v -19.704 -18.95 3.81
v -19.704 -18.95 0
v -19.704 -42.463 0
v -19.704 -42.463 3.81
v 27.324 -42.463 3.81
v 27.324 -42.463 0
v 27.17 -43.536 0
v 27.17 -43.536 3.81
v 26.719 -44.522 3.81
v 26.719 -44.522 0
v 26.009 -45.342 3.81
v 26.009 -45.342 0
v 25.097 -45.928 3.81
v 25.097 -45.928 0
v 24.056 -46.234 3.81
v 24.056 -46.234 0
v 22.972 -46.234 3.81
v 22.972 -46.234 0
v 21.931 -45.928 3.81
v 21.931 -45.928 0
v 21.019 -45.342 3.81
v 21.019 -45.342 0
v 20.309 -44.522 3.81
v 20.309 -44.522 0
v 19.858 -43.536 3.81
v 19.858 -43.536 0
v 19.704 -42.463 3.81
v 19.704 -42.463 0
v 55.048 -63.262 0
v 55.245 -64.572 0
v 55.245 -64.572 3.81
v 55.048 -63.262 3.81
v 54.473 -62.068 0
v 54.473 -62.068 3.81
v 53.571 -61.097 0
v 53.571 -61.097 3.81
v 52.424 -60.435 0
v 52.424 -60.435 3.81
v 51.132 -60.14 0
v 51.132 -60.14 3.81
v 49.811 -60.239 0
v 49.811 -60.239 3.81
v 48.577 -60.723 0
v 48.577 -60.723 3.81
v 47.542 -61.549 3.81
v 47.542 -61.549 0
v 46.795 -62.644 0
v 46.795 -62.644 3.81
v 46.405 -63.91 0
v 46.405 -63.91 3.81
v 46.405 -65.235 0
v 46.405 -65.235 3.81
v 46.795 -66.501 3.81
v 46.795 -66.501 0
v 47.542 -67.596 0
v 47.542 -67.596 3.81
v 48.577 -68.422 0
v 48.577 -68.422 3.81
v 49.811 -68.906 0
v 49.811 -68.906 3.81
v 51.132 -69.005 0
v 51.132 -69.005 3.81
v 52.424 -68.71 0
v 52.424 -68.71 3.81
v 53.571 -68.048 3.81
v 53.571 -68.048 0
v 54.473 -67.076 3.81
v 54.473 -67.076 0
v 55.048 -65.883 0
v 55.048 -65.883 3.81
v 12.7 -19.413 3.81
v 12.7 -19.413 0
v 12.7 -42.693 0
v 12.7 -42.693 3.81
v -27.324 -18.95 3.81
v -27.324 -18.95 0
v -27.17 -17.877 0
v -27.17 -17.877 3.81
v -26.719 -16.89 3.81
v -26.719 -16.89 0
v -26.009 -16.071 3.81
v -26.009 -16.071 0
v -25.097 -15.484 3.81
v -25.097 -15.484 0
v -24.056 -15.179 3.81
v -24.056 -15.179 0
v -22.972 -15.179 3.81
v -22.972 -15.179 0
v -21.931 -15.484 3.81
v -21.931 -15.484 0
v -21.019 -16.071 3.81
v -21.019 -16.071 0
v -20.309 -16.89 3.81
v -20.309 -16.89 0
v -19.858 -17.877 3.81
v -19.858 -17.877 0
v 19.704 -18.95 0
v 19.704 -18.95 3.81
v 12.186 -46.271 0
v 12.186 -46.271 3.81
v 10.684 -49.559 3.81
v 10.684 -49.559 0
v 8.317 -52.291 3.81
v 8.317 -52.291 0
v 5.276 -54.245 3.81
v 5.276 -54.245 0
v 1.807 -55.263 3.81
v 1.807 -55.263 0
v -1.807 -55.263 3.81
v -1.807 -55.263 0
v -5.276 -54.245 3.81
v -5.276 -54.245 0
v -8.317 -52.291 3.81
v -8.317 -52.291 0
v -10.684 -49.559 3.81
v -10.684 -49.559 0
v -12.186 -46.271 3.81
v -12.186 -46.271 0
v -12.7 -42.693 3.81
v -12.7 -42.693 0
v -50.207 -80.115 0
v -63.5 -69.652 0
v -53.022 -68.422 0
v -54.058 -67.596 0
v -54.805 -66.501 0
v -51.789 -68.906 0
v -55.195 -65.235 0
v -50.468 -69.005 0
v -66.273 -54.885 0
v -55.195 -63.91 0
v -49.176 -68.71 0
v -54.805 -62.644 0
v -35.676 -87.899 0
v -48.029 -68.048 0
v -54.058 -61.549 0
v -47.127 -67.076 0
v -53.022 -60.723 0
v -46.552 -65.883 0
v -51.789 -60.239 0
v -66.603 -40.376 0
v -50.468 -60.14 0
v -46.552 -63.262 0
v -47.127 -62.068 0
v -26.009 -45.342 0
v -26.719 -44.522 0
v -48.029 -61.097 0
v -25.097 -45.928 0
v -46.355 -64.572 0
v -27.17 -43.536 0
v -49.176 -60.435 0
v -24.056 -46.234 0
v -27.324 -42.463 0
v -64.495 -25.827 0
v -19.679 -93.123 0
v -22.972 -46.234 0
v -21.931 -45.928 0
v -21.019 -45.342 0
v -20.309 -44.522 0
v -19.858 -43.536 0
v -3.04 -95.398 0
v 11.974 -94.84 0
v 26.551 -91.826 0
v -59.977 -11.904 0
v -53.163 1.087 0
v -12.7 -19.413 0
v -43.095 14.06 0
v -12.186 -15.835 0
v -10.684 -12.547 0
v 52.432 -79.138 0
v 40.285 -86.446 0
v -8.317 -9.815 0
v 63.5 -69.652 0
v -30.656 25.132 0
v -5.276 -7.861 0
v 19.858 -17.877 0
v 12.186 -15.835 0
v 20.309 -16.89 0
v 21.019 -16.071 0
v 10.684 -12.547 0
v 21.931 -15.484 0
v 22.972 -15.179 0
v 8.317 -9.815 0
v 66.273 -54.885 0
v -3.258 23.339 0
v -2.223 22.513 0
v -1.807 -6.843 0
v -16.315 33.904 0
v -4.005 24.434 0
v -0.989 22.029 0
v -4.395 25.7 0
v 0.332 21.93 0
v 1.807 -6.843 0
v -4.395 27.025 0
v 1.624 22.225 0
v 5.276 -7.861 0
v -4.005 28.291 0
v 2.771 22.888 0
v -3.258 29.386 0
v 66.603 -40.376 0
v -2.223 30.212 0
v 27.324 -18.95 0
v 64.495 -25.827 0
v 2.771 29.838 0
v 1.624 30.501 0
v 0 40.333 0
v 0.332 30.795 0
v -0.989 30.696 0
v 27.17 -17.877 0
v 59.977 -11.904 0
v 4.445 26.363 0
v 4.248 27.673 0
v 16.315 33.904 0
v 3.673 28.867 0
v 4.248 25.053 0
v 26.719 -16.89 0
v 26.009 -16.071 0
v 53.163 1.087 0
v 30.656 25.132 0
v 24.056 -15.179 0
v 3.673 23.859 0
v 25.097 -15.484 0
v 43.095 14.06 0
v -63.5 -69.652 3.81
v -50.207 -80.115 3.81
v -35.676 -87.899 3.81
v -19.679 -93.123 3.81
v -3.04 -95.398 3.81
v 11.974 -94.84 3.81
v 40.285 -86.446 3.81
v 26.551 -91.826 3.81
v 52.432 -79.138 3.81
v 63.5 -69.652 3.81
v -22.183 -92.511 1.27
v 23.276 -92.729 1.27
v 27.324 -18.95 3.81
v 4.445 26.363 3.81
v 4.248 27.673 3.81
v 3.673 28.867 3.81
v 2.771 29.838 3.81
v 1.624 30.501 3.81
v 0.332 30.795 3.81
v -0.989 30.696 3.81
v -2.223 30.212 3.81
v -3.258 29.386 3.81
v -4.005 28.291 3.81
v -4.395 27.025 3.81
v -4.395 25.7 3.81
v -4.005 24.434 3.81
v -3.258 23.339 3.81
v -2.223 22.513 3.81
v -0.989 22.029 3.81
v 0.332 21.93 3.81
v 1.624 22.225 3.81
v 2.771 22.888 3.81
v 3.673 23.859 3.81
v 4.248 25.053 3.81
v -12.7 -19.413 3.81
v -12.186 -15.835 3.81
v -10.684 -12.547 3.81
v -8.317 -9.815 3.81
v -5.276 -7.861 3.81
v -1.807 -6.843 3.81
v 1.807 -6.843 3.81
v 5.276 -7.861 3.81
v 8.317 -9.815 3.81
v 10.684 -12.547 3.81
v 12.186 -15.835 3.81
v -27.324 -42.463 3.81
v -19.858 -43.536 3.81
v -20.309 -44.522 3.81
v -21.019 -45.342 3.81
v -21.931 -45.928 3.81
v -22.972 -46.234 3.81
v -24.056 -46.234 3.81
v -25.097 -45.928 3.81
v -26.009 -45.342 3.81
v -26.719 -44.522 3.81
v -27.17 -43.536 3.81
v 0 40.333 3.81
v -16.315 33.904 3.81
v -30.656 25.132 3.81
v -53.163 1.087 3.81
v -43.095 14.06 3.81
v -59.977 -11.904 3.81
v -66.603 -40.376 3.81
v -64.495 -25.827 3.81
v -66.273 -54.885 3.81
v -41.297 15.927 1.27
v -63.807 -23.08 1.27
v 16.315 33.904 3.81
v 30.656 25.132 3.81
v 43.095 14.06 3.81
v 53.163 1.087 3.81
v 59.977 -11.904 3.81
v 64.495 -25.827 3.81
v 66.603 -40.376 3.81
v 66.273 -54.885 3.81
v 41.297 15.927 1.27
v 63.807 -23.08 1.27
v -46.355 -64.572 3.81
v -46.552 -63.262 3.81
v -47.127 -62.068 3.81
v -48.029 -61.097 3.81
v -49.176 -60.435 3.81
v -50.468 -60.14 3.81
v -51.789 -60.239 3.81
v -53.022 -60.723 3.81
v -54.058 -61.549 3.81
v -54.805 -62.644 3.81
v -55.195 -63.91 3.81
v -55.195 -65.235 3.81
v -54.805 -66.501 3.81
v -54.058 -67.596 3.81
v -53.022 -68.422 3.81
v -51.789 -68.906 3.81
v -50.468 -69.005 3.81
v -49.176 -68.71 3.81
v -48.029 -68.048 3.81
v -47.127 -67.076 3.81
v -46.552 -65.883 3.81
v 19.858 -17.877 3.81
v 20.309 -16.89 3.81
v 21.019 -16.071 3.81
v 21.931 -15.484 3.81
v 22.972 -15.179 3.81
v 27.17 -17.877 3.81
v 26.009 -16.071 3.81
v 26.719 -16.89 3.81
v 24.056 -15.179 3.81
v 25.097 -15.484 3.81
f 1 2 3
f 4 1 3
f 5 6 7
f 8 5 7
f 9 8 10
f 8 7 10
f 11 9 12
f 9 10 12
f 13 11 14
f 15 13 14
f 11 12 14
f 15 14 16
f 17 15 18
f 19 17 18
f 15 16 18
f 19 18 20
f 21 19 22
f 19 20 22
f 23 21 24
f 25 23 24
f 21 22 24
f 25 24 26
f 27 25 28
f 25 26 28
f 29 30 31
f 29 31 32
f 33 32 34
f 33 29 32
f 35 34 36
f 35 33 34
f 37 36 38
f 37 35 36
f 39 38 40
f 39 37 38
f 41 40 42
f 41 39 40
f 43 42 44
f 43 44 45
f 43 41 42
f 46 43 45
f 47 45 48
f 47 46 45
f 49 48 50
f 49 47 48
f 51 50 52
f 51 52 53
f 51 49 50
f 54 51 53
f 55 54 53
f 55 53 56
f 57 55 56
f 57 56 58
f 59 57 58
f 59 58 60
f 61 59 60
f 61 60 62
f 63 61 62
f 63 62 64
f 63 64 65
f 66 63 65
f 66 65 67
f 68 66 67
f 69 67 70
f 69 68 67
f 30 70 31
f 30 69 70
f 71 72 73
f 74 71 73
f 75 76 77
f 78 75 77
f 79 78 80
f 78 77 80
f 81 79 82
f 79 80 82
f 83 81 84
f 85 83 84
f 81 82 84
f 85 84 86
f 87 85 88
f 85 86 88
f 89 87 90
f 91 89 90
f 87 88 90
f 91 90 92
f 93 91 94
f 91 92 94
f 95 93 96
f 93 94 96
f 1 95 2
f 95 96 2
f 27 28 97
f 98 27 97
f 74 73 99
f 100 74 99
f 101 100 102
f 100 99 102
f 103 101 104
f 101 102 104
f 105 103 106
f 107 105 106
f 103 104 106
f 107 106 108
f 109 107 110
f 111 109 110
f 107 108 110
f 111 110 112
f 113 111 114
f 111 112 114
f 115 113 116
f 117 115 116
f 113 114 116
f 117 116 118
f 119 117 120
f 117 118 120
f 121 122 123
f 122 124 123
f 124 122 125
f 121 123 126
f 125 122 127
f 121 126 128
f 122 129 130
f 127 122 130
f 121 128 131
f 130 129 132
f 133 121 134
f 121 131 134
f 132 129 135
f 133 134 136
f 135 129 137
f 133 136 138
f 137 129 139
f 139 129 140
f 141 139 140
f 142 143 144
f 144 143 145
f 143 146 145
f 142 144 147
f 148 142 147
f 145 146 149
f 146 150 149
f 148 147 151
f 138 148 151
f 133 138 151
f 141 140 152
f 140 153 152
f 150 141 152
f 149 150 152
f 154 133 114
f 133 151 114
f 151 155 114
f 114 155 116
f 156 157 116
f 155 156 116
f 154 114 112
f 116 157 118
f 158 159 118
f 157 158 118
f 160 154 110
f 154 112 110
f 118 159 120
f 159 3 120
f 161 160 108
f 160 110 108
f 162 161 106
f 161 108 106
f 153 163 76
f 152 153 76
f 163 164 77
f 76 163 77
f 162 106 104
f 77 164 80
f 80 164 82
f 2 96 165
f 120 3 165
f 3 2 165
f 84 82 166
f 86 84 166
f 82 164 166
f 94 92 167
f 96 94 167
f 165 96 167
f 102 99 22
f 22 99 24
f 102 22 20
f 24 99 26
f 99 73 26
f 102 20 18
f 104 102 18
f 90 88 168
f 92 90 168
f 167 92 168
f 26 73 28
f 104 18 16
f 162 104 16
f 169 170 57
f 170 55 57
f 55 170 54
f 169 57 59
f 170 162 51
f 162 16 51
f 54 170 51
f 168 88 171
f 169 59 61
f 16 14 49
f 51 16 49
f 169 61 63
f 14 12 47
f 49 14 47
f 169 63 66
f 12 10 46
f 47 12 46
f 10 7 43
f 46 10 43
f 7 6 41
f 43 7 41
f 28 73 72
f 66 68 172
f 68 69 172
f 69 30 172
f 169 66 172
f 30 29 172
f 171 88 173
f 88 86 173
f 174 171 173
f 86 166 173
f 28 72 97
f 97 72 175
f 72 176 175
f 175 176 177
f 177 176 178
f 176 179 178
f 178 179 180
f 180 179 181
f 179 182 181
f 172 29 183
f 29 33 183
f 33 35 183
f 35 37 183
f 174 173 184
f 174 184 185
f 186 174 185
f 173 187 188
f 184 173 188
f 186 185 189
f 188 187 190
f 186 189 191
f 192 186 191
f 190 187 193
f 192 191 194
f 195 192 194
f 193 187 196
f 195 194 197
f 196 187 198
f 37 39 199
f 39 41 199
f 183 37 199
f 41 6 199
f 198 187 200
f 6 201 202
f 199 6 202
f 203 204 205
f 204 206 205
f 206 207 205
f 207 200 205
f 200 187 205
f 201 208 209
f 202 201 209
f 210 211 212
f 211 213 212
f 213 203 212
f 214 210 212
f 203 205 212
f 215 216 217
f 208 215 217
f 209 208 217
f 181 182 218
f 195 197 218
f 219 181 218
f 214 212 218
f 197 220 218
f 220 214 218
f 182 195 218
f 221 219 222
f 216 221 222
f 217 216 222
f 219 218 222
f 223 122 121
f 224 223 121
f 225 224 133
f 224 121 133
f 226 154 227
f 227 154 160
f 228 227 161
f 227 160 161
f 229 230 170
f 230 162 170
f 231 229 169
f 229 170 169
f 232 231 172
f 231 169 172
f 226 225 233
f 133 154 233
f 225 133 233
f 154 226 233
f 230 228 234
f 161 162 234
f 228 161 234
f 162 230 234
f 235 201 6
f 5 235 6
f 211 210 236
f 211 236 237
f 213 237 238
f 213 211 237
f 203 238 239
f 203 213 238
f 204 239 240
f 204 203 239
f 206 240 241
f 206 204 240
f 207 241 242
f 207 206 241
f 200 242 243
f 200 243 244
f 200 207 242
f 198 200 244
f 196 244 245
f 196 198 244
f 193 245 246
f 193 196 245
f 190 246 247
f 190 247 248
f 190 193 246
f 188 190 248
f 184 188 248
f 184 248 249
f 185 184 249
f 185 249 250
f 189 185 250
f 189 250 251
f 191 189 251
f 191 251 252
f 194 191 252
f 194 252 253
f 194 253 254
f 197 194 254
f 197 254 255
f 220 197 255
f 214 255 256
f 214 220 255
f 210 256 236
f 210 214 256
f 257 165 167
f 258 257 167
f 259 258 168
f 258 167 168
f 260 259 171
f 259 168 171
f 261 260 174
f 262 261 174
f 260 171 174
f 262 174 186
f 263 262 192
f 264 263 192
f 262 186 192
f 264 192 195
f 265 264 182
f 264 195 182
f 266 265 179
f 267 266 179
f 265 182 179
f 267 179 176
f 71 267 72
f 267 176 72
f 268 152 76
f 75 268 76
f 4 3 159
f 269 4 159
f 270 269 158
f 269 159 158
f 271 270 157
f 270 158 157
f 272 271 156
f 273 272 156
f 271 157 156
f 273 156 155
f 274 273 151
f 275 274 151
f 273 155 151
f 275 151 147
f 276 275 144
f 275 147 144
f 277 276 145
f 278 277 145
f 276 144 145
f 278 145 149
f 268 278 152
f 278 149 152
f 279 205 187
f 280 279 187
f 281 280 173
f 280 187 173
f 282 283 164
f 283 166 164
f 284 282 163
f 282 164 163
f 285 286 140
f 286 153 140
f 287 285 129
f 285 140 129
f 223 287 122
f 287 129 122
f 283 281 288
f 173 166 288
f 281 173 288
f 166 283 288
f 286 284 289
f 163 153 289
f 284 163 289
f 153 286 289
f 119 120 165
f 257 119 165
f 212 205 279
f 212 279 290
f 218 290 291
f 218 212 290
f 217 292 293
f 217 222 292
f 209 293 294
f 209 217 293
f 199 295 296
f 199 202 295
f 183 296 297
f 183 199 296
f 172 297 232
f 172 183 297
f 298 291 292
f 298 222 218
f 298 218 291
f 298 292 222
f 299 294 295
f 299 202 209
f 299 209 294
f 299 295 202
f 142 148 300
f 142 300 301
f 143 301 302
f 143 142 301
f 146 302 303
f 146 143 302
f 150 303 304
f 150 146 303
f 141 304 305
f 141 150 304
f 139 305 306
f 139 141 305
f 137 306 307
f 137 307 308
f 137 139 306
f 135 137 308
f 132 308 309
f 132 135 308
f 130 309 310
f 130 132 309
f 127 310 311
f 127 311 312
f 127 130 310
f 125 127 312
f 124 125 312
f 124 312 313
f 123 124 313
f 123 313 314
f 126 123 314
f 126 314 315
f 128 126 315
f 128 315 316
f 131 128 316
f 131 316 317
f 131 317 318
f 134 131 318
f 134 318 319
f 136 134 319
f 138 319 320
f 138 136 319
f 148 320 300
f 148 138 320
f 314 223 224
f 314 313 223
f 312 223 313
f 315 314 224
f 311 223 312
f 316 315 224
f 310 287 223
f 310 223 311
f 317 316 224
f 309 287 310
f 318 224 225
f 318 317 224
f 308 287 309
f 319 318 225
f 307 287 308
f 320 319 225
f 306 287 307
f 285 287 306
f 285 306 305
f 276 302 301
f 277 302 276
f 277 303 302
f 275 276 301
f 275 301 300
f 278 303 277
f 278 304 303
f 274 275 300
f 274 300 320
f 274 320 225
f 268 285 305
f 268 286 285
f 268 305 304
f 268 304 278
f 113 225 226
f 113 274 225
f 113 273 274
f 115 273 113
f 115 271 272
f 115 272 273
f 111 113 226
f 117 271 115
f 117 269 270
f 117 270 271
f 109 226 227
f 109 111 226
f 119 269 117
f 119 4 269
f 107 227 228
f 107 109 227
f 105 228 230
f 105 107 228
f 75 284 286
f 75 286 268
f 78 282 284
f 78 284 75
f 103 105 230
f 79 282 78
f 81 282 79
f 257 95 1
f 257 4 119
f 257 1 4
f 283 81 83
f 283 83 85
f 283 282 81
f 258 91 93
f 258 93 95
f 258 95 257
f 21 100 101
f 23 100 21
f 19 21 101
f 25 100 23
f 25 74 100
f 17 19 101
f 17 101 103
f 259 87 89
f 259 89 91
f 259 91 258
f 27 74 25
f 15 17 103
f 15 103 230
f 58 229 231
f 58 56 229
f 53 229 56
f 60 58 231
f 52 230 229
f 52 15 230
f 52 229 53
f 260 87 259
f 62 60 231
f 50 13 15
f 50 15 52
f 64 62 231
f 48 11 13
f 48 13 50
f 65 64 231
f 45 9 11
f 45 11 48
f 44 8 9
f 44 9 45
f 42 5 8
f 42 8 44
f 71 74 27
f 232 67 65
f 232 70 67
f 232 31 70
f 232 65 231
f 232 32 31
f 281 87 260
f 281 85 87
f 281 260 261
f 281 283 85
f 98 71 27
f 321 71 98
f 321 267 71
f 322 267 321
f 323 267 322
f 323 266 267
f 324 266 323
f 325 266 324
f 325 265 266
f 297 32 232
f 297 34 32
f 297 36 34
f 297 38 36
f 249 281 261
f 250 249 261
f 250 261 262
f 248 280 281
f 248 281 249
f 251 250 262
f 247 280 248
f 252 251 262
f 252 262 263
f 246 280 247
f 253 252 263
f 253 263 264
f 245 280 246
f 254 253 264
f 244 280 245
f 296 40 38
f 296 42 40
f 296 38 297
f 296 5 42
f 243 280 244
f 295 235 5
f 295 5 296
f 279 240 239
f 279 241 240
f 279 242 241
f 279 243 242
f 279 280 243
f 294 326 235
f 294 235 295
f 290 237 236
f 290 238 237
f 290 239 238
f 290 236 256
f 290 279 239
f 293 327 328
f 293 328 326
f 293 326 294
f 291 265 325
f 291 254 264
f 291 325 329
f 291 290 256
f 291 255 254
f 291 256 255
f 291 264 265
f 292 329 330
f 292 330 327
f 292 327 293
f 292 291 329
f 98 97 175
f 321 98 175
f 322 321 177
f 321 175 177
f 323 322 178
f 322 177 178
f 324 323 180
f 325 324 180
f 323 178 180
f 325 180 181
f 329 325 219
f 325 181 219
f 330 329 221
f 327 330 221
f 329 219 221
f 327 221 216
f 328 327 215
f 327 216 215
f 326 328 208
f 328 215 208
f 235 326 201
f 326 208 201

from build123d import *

# Parameters (mm, degrees)
F0_R     = 4.445
F1_DEPTH = 3.81


with BuildPart() as f1:
    # F0 (on Top) → F1 (new body)
    with BuildSketch(Plane.XY):
        with BuildLine():
            Line((63.5, -69.652364), (-63.5, -69.652364))
            add(Edge.make_bspline(
                [(-63.5, -69.652364), (-27.377963, -103.611864), (29.017352, -104.595505), (63.5, -69.652364)],
                knots=[0, 0, 0, 0, 127, 127, 127, 127], degree=3))
        make_face()
        with BuildLine():
            add(Edge.make_bspline(
                [(0, 40.332863), (49.345907, 25.572751), (76.559924, -21.641931), (63.5, -69.652364)],
                knots=[0, 0, 0, 0, 127, 127, 127, 127], degree=3))
            Line((0, 40.332863), (63.5, -69.652364))
        make_face()
        Polygon((63.5, -69.652364), (0, 40.332863), (-63.5, -69.652364), align=None)
        with Locations((-50.8, -64.572364)):
            Circle(F0_R, mode=Mode.SUBTRACT)
        with Locations((50.8, -64.572364)):
            Circle(F0_R, mode=Mode.SUBTRACT)
        with BuildLine():
            Line((-19.703986, -18.950023), (-19.703986, -42.462528))
            ThreePointArc((-19.703986, -42.462528), (-23.513986, -46.272528), (-27.323986, -42.462528))
            Line((-27.323986, -42.462528), (-27.323986, -18.950023))
            ThreePointArc((-27.323986, -18.950023), (-23.513986, -15.140023), (-19.703986, -18.950023))
        make_face(mode=Mode.SUBTRACT)
        with BuildLine():
            ThreePointArc((-12.7, -19.413278), (0, -6.713278), (12.7, -19.413278))
            Line((12.7, -19.413278), (12.7, -42.692736))
            ThreePointArc((12.7, -42.692736), (0, -55.392736), (-12.7, -42.692736))
            Line((-12.7, -42.692736), (-12.7, -19.413278))
        make_face(mode=Mode.SUBTRACT)
        with BuildLine():
            Line((19.703986, -42.462528), (19.703986, -18.950023))
            ThreePointArc((19.703986, -18.950023), (23.513986, -15.140023), (27.323986, -18.950023))
            Line((27.323986, -18.950023), (27.323986, -42.462528))
            ThreePointArc((27.323986, -42.462528), (23.513986, -46.272528), (19.703986, -42.462528))
        make_face(mode=Mode.SUBTRACT)
        with Locations((0, 26.362863)):
            Circle(F0_R, mode=Mode.SUBTRACT)
        with BuildLine():
            Line((-63.5, -69.652364), (0, 40.332863))
            add(Edge.make_bspline(
                [(0, 40.332863), (-49.345907, 25.572751), (-76.559924, -21.641931), (-63.5, -69.652364)],
                knots=[0, 0, 0, 0, 127, 127, 127, 127], degree=3))
        make_face()
    extrude(amount=F1_DEPTH)


solid = f1.part
